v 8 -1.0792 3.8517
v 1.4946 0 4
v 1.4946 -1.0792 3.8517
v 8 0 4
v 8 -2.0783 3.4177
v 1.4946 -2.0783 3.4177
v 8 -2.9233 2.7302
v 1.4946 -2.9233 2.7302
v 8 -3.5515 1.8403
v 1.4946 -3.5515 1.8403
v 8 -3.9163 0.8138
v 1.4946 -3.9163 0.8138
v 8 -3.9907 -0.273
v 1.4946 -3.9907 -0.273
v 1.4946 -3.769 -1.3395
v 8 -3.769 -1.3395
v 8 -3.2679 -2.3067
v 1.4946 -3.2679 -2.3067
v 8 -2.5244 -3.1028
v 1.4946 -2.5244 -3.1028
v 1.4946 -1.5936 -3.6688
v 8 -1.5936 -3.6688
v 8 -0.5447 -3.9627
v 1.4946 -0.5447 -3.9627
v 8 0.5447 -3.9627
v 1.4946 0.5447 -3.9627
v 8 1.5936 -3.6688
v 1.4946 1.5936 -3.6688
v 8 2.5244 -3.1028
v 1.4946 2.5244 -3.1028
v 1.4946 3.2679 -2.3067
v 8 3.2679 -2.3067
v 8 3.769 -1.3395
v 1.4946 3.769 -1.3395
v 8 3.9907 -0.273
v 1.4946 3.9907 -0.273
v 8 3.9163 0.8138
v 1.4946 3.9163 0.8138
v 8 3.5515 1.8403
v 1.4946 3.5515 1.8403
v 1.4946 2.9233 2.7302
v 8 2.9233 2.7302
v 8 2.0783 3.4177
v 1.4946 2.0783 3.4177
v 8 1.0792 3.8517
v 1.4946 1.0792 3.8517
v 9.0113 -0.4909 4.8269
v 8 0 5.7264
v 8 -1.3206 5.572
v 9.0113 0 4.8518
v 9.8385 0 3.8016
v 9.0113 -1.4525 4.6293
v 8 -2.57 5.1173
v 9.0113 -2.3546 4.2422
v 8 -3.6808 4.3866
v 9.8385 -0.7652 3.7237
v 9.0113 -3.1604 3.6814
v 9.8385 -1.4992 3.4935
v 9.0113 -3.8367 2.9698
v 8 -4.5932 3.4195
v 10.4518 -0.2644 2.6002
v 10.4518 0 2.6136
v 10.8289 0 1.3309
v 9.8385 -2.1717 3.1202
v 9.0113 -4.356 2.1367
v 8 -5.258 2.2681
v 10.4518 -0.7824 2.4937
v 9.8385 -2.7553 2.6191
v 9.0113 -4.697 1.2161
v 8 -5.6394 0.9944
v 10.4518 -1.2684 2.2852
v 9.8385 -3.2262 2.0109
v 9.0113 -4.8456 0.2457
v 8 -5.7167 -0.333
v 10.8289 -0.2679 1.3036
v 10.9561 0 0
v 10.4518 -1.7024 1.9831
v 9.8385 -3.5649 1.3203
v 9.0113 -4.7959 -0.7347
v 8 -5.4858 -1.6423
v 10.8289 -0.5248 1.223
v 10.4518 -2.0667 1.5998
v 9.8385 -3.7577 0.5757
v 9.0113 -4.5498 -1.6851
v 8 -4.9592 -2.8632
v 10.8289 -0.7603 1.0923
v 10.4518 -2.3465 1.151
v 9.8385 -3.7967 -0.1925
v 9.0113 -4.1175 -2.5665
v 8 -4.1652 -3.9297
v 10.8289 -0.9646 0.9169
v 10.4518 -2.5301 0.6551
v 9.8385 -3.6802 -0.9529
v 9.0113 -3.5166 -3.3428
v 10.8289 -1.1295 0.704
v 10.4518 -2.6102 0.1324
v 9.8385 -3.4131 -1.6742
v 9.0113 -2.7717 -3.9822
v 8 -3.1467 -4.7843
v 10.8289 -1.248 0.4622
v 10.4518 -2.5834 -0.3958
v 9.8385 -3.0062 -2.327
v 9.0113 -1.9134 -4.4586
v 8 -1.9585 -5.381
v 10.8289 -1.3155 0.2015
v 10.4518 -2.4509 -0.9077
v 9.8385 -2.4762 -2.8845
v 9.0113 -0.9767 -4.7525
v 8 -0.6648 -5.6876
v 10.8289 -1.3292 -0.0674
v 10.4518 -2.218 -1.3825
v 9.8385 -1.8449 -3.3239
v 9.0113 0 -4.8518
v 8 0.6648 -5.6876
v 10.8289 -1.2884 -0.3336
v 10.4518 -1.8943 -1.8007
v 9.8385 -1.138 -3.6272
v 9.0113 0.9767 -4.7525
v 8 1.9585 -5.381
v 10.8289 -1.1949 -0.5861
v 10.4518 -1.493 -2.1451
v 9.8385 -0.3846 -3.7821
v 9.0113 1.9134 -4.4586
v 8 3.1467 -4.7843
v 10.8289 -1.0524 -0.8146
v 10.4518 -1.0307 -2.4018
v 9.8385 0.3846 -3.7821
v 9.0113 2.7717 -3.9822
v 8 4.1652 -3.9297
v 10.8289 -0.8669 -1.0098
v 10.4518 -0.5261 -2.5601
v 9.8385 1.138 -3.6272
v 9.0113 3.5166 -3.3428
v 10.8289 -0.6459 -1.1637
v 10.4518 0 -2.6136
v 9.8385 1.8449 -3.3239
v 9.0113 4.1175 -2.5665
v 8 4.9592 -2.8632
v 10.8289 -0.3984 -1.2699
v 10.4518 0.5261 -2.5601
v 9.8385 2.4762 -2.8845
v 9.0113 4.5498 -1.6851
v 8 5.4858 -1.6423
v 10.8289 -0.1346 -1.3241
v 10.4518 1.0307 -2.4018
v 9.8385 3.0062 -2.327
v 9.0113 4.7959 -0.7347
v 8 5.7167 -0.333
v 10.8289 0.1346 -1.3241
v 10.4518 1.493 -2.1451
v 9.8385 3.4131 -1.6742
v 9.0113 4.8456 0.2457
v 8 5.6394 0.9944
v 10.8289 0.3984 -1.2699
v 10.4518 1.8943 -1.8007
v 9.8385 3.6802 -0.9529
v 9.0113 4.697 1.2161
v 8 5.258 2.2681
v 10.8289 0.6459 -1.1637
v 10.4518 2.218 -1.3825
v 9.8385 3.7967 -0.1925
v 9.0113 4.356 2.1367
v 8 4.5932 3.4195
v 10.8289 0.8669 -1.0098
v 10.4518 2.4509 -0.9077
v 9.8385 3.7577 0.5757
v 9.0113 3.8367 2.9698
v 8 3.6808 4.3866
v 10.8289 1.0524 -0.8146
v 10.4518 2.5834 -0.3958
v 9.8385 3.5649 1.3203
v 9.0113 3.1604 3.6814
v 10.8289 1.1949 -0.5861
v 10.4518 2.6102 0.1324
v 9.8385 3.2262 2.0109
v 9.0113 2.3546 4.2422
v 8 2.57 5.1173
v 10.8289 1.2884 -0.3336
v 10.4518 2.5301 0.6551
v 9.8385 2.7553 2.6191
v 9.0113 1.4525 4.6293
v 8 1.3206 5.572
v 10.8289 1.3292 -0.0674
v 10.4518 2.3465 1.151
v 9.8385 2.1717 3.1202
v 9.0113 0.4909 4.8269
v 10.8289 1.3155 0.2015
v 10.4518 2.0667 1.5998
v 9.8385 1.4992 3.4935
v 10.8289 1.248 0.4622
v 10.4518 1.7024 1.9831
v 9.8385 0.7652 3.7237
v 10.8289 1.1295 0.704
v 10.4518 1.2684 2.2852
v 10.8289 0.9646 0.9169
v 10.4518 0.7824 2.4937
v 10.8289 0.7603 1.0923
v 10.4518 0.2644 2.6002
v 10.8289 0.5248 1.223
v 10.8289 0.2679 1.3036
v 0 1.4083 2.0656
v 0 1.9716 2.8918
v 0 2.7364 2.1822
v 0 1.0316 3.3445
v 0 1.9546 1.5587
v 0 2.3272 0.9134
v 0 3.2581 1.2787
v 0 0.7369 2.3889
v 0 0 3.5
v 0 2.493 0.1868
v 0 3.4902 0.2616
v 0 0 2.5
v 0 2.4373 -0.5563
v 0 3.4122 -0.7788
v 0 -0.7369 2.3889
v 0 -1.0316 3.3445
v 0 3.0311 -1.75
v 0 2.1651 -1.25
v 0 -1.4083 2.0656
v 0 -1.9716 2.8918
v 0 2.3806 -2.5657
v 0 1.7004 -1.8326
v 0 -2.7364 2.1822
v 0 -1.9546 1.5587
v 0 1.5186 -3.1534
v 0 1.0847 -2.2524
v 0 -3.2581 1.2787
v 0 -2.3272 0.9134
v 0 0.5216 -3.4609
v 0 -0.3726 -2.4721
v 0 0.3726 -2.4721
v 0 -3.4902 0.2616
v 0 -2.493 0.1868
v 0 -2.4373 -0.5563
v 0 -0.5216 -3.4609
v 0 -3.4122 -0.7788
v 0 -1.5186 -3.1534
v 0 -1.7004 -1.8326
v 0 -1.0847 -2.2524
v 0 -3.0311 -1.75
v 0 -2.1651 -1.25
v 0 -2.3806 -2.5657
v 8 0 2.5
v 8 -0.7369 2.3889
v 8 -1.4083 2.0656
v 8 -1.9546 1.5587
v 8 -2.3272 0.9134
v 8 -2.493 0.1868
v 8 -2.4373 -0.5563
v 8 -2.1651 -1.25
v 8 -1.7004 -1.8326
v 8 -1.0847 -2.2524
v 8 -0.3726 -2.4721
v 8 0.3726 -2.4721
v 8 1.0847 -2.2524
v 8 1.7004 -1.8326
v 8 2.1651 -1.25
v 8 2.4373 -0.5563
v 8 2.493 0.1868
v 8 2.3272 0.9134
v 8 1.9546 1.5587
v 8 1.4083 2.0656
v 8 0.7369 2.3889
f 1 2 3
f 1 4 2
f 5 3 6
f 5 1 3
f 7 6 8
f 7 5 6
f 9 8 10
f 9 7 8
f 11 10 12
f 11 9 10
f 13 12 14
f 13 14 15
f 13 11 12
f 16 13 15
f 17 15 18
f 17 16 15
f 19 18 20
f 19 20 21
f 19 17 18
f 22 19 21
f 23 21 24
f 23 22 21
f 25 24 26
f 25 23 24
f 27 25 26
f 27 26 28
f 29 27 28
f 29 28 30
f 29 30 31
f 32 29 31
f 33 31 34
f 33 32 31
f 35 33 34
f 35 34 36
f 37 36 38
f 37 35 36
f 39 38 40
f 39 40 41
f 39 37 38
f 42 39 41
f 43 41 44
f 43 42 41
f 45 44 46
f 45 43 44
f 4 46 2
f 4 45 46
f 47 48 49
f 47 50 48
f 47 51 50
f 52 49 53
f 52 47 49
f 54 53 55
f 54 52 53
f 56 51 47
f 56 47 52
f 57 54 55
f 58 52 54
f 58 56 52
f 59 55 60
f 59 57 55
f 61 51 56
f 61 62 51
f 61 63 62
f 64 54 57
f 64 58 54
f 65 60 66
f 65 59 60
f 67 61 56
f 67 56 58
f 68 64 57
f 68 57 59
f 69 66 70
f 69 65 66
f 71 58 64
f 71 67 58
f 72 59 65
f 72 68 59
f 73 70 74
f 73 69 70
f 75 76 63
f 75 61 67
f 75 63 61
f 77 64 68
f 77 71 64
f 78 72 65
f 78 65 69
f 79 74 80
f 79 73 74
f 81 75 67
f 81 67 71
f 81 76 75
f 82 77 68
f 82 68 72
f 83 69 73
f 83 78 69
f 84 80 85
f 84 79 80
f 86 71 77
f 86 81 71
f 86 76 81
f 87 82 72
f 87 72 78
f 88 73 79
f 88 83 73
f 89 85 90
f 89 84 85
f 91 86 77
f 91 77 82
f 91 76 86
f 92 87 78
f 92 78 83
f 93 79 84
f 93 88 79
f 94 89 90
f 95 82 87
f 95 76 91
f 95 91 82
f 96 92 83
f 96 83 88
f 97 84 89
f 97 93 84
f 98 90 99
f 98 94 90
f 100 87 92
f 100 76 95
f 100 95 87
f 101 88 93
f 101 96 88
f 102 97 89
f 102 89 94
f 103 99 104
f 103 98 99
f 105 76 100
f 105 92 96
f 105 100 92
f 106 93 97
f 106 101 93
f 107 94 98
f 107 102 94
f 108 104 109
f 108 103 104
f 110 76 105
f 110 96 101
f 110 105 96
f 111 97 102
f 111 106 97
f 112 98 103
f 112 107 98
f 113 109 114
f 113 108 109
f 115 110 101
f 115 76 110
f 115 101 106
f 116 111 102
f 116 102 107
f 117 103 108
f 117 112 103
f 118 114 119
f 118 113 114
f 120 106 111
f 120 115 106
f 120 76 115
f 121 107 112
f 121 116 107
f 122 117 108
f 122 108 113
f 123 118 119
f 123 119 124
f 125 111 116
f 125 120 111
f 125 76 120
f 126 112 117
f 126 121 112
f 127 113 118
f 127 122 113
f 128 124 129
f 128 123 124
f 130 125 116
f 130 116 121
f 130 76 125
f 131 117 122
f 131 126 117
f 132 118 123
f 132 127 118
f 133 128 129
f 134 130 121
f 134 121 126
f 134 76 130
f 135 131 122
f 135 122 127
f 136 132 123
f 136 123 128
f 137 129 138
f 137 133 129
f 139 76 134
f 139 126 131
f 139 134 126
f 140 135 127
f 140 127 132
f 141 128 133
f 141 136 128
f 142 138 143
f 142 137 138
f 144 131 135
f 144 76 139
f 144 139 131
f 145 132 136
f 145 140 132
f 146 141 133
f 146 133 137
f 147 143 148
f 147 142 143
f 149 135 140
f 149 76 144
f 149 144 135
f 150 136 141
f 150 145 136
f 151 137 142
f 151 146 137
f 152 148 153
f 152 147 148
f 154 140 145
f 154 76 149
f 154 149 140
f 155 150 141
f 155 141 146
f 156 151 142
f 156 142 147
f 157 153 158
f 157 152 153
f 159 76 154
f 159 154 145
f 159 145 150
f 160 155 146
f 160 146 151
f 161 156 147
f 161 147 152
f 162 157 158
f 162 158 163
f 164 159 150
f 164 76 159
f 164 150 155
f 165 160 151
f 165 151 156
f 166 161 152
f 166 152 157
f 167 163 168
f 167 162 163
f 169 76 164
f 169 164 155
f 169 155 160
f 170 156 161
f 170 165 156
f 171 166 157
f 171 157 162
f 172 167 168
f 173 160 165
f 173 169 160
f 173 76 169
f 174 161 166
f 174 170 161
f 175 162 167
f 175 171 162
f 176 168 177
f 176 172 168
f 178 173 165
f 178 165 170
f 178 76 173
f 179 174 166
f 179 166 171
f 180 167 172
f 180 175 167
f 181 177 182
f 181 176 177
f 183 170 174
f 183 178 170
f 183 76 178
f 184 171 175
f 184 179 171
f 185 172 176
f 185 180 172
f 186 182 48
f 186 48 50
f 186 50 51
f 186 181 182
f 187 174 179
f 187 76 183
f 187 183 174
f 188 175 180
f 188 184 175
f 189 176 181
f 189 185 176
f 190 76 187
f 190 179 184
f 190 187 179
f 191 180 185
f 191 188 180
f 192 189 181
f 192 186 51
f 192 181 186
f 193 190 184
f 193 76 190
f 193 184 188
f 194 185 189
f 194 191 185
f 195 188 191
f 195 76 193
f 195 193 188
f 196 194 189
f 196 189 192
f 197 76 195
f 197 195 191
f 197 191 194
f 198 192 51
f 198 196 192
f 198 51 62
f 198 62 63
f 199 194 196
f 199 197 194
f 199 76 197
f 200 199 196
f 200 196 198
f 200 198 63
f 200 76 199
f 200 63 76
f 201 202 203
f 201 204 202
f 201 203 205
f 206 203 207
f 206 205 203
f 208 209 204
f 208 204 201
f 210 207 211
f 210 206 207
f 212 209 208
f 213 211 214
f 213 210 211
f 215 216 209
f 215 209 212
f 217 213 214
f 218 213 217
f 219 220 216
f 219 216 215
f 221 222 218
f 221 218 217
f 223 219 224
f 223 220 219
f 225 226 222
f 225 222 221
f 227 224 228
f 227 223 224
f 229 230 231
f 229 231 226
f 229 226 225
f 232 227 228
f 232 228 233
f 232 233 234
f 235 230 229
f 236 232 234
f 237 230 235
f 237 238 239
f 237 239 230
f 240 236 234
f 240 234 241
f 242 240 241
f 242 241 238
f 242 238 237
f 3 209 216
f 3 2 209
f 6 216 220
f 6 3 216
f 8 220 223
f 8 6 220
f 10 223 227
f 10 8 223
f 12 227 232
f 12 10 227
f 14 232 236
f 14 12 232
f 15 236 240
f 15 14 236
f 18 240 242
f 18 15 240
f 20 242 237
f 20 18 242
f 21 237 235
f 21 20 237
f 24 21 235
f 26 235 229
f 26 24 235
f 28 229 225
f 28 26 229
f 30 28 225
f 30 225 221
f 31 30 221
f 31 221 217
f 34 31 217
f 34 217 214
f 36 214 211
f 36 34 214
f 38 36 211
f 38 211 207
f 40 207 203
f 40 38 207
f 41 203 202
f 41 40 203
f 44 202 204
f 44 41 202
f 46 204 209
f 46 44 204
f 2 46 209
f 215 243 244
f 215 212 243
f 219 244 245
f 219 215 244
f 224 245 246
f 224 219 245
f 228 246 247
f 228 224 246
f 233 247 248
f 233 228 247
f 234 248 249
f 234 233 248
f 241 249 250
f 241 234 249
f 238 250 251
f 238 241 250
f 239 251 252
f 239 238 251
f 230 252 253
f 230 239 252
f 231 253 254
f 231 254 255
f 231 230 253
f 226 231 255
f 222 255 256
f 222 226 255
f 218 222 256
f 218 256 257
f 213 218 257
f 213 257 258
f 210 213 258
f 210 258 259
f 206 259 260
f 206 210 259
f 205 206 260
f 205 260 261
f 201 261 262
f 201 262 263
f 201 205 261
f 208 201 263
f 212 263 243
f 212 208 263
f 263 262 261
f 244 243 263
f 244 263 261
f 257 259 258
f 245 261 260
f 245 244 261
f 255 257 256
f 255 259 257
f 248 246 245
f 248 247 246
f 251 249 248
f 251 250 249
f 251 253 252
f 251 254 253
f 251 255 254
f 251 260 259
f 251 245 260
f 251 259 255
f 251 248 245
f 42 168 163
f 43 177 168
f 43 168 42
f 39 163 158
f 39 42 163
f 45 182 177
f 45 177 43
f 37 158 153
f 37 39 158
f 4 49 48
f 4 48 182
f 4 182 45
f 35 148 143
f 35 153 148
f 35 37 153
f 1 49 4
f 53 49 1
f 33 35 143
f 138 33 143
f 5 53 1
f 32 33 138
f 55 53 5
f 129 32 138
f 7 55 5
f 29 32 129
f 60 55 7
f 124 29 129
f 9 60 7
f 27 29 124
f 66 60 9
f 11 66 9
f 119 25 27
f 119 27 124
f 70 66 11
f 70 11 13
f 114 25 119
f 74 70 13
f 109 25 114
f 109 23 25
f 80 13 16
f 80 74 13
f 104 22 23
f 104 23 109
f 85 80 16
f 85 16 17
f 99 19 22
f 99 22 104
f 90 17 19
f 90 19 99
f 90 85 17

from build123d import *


with BuildPart() as part:
    # 草图1 → 旋转1 (revolve)
    with BuildSketch(Plane.XY, mode=Mode.PRIVATE) as revolve_1_sk:
        with BuildLine():
            Line((0, 2.5), (0, 3.5))
            Line((0, 3.5), (1.494559039, 4))
            Line((1.494559039, 4), (8, 4))
            Line((8, 4), (8, 5.726362631))
            ThreePointArc((8, 5.726362631), (10.173497708, 3.222185879), (10.956128949, 0))
            Line((10.956128949, 0), (8, 0))
            Line((8, 0), (8, 2.5))
            Line((8, 2.5), (0, 2.5))
        make_face()
    revolve(revolve_1_sk.sketch.rotate(Axis((0, 0, 0), (1, 0, 0)), 90), axis=Axis((0, 0, 0), (1, 0, 0)))


solid = part.part
